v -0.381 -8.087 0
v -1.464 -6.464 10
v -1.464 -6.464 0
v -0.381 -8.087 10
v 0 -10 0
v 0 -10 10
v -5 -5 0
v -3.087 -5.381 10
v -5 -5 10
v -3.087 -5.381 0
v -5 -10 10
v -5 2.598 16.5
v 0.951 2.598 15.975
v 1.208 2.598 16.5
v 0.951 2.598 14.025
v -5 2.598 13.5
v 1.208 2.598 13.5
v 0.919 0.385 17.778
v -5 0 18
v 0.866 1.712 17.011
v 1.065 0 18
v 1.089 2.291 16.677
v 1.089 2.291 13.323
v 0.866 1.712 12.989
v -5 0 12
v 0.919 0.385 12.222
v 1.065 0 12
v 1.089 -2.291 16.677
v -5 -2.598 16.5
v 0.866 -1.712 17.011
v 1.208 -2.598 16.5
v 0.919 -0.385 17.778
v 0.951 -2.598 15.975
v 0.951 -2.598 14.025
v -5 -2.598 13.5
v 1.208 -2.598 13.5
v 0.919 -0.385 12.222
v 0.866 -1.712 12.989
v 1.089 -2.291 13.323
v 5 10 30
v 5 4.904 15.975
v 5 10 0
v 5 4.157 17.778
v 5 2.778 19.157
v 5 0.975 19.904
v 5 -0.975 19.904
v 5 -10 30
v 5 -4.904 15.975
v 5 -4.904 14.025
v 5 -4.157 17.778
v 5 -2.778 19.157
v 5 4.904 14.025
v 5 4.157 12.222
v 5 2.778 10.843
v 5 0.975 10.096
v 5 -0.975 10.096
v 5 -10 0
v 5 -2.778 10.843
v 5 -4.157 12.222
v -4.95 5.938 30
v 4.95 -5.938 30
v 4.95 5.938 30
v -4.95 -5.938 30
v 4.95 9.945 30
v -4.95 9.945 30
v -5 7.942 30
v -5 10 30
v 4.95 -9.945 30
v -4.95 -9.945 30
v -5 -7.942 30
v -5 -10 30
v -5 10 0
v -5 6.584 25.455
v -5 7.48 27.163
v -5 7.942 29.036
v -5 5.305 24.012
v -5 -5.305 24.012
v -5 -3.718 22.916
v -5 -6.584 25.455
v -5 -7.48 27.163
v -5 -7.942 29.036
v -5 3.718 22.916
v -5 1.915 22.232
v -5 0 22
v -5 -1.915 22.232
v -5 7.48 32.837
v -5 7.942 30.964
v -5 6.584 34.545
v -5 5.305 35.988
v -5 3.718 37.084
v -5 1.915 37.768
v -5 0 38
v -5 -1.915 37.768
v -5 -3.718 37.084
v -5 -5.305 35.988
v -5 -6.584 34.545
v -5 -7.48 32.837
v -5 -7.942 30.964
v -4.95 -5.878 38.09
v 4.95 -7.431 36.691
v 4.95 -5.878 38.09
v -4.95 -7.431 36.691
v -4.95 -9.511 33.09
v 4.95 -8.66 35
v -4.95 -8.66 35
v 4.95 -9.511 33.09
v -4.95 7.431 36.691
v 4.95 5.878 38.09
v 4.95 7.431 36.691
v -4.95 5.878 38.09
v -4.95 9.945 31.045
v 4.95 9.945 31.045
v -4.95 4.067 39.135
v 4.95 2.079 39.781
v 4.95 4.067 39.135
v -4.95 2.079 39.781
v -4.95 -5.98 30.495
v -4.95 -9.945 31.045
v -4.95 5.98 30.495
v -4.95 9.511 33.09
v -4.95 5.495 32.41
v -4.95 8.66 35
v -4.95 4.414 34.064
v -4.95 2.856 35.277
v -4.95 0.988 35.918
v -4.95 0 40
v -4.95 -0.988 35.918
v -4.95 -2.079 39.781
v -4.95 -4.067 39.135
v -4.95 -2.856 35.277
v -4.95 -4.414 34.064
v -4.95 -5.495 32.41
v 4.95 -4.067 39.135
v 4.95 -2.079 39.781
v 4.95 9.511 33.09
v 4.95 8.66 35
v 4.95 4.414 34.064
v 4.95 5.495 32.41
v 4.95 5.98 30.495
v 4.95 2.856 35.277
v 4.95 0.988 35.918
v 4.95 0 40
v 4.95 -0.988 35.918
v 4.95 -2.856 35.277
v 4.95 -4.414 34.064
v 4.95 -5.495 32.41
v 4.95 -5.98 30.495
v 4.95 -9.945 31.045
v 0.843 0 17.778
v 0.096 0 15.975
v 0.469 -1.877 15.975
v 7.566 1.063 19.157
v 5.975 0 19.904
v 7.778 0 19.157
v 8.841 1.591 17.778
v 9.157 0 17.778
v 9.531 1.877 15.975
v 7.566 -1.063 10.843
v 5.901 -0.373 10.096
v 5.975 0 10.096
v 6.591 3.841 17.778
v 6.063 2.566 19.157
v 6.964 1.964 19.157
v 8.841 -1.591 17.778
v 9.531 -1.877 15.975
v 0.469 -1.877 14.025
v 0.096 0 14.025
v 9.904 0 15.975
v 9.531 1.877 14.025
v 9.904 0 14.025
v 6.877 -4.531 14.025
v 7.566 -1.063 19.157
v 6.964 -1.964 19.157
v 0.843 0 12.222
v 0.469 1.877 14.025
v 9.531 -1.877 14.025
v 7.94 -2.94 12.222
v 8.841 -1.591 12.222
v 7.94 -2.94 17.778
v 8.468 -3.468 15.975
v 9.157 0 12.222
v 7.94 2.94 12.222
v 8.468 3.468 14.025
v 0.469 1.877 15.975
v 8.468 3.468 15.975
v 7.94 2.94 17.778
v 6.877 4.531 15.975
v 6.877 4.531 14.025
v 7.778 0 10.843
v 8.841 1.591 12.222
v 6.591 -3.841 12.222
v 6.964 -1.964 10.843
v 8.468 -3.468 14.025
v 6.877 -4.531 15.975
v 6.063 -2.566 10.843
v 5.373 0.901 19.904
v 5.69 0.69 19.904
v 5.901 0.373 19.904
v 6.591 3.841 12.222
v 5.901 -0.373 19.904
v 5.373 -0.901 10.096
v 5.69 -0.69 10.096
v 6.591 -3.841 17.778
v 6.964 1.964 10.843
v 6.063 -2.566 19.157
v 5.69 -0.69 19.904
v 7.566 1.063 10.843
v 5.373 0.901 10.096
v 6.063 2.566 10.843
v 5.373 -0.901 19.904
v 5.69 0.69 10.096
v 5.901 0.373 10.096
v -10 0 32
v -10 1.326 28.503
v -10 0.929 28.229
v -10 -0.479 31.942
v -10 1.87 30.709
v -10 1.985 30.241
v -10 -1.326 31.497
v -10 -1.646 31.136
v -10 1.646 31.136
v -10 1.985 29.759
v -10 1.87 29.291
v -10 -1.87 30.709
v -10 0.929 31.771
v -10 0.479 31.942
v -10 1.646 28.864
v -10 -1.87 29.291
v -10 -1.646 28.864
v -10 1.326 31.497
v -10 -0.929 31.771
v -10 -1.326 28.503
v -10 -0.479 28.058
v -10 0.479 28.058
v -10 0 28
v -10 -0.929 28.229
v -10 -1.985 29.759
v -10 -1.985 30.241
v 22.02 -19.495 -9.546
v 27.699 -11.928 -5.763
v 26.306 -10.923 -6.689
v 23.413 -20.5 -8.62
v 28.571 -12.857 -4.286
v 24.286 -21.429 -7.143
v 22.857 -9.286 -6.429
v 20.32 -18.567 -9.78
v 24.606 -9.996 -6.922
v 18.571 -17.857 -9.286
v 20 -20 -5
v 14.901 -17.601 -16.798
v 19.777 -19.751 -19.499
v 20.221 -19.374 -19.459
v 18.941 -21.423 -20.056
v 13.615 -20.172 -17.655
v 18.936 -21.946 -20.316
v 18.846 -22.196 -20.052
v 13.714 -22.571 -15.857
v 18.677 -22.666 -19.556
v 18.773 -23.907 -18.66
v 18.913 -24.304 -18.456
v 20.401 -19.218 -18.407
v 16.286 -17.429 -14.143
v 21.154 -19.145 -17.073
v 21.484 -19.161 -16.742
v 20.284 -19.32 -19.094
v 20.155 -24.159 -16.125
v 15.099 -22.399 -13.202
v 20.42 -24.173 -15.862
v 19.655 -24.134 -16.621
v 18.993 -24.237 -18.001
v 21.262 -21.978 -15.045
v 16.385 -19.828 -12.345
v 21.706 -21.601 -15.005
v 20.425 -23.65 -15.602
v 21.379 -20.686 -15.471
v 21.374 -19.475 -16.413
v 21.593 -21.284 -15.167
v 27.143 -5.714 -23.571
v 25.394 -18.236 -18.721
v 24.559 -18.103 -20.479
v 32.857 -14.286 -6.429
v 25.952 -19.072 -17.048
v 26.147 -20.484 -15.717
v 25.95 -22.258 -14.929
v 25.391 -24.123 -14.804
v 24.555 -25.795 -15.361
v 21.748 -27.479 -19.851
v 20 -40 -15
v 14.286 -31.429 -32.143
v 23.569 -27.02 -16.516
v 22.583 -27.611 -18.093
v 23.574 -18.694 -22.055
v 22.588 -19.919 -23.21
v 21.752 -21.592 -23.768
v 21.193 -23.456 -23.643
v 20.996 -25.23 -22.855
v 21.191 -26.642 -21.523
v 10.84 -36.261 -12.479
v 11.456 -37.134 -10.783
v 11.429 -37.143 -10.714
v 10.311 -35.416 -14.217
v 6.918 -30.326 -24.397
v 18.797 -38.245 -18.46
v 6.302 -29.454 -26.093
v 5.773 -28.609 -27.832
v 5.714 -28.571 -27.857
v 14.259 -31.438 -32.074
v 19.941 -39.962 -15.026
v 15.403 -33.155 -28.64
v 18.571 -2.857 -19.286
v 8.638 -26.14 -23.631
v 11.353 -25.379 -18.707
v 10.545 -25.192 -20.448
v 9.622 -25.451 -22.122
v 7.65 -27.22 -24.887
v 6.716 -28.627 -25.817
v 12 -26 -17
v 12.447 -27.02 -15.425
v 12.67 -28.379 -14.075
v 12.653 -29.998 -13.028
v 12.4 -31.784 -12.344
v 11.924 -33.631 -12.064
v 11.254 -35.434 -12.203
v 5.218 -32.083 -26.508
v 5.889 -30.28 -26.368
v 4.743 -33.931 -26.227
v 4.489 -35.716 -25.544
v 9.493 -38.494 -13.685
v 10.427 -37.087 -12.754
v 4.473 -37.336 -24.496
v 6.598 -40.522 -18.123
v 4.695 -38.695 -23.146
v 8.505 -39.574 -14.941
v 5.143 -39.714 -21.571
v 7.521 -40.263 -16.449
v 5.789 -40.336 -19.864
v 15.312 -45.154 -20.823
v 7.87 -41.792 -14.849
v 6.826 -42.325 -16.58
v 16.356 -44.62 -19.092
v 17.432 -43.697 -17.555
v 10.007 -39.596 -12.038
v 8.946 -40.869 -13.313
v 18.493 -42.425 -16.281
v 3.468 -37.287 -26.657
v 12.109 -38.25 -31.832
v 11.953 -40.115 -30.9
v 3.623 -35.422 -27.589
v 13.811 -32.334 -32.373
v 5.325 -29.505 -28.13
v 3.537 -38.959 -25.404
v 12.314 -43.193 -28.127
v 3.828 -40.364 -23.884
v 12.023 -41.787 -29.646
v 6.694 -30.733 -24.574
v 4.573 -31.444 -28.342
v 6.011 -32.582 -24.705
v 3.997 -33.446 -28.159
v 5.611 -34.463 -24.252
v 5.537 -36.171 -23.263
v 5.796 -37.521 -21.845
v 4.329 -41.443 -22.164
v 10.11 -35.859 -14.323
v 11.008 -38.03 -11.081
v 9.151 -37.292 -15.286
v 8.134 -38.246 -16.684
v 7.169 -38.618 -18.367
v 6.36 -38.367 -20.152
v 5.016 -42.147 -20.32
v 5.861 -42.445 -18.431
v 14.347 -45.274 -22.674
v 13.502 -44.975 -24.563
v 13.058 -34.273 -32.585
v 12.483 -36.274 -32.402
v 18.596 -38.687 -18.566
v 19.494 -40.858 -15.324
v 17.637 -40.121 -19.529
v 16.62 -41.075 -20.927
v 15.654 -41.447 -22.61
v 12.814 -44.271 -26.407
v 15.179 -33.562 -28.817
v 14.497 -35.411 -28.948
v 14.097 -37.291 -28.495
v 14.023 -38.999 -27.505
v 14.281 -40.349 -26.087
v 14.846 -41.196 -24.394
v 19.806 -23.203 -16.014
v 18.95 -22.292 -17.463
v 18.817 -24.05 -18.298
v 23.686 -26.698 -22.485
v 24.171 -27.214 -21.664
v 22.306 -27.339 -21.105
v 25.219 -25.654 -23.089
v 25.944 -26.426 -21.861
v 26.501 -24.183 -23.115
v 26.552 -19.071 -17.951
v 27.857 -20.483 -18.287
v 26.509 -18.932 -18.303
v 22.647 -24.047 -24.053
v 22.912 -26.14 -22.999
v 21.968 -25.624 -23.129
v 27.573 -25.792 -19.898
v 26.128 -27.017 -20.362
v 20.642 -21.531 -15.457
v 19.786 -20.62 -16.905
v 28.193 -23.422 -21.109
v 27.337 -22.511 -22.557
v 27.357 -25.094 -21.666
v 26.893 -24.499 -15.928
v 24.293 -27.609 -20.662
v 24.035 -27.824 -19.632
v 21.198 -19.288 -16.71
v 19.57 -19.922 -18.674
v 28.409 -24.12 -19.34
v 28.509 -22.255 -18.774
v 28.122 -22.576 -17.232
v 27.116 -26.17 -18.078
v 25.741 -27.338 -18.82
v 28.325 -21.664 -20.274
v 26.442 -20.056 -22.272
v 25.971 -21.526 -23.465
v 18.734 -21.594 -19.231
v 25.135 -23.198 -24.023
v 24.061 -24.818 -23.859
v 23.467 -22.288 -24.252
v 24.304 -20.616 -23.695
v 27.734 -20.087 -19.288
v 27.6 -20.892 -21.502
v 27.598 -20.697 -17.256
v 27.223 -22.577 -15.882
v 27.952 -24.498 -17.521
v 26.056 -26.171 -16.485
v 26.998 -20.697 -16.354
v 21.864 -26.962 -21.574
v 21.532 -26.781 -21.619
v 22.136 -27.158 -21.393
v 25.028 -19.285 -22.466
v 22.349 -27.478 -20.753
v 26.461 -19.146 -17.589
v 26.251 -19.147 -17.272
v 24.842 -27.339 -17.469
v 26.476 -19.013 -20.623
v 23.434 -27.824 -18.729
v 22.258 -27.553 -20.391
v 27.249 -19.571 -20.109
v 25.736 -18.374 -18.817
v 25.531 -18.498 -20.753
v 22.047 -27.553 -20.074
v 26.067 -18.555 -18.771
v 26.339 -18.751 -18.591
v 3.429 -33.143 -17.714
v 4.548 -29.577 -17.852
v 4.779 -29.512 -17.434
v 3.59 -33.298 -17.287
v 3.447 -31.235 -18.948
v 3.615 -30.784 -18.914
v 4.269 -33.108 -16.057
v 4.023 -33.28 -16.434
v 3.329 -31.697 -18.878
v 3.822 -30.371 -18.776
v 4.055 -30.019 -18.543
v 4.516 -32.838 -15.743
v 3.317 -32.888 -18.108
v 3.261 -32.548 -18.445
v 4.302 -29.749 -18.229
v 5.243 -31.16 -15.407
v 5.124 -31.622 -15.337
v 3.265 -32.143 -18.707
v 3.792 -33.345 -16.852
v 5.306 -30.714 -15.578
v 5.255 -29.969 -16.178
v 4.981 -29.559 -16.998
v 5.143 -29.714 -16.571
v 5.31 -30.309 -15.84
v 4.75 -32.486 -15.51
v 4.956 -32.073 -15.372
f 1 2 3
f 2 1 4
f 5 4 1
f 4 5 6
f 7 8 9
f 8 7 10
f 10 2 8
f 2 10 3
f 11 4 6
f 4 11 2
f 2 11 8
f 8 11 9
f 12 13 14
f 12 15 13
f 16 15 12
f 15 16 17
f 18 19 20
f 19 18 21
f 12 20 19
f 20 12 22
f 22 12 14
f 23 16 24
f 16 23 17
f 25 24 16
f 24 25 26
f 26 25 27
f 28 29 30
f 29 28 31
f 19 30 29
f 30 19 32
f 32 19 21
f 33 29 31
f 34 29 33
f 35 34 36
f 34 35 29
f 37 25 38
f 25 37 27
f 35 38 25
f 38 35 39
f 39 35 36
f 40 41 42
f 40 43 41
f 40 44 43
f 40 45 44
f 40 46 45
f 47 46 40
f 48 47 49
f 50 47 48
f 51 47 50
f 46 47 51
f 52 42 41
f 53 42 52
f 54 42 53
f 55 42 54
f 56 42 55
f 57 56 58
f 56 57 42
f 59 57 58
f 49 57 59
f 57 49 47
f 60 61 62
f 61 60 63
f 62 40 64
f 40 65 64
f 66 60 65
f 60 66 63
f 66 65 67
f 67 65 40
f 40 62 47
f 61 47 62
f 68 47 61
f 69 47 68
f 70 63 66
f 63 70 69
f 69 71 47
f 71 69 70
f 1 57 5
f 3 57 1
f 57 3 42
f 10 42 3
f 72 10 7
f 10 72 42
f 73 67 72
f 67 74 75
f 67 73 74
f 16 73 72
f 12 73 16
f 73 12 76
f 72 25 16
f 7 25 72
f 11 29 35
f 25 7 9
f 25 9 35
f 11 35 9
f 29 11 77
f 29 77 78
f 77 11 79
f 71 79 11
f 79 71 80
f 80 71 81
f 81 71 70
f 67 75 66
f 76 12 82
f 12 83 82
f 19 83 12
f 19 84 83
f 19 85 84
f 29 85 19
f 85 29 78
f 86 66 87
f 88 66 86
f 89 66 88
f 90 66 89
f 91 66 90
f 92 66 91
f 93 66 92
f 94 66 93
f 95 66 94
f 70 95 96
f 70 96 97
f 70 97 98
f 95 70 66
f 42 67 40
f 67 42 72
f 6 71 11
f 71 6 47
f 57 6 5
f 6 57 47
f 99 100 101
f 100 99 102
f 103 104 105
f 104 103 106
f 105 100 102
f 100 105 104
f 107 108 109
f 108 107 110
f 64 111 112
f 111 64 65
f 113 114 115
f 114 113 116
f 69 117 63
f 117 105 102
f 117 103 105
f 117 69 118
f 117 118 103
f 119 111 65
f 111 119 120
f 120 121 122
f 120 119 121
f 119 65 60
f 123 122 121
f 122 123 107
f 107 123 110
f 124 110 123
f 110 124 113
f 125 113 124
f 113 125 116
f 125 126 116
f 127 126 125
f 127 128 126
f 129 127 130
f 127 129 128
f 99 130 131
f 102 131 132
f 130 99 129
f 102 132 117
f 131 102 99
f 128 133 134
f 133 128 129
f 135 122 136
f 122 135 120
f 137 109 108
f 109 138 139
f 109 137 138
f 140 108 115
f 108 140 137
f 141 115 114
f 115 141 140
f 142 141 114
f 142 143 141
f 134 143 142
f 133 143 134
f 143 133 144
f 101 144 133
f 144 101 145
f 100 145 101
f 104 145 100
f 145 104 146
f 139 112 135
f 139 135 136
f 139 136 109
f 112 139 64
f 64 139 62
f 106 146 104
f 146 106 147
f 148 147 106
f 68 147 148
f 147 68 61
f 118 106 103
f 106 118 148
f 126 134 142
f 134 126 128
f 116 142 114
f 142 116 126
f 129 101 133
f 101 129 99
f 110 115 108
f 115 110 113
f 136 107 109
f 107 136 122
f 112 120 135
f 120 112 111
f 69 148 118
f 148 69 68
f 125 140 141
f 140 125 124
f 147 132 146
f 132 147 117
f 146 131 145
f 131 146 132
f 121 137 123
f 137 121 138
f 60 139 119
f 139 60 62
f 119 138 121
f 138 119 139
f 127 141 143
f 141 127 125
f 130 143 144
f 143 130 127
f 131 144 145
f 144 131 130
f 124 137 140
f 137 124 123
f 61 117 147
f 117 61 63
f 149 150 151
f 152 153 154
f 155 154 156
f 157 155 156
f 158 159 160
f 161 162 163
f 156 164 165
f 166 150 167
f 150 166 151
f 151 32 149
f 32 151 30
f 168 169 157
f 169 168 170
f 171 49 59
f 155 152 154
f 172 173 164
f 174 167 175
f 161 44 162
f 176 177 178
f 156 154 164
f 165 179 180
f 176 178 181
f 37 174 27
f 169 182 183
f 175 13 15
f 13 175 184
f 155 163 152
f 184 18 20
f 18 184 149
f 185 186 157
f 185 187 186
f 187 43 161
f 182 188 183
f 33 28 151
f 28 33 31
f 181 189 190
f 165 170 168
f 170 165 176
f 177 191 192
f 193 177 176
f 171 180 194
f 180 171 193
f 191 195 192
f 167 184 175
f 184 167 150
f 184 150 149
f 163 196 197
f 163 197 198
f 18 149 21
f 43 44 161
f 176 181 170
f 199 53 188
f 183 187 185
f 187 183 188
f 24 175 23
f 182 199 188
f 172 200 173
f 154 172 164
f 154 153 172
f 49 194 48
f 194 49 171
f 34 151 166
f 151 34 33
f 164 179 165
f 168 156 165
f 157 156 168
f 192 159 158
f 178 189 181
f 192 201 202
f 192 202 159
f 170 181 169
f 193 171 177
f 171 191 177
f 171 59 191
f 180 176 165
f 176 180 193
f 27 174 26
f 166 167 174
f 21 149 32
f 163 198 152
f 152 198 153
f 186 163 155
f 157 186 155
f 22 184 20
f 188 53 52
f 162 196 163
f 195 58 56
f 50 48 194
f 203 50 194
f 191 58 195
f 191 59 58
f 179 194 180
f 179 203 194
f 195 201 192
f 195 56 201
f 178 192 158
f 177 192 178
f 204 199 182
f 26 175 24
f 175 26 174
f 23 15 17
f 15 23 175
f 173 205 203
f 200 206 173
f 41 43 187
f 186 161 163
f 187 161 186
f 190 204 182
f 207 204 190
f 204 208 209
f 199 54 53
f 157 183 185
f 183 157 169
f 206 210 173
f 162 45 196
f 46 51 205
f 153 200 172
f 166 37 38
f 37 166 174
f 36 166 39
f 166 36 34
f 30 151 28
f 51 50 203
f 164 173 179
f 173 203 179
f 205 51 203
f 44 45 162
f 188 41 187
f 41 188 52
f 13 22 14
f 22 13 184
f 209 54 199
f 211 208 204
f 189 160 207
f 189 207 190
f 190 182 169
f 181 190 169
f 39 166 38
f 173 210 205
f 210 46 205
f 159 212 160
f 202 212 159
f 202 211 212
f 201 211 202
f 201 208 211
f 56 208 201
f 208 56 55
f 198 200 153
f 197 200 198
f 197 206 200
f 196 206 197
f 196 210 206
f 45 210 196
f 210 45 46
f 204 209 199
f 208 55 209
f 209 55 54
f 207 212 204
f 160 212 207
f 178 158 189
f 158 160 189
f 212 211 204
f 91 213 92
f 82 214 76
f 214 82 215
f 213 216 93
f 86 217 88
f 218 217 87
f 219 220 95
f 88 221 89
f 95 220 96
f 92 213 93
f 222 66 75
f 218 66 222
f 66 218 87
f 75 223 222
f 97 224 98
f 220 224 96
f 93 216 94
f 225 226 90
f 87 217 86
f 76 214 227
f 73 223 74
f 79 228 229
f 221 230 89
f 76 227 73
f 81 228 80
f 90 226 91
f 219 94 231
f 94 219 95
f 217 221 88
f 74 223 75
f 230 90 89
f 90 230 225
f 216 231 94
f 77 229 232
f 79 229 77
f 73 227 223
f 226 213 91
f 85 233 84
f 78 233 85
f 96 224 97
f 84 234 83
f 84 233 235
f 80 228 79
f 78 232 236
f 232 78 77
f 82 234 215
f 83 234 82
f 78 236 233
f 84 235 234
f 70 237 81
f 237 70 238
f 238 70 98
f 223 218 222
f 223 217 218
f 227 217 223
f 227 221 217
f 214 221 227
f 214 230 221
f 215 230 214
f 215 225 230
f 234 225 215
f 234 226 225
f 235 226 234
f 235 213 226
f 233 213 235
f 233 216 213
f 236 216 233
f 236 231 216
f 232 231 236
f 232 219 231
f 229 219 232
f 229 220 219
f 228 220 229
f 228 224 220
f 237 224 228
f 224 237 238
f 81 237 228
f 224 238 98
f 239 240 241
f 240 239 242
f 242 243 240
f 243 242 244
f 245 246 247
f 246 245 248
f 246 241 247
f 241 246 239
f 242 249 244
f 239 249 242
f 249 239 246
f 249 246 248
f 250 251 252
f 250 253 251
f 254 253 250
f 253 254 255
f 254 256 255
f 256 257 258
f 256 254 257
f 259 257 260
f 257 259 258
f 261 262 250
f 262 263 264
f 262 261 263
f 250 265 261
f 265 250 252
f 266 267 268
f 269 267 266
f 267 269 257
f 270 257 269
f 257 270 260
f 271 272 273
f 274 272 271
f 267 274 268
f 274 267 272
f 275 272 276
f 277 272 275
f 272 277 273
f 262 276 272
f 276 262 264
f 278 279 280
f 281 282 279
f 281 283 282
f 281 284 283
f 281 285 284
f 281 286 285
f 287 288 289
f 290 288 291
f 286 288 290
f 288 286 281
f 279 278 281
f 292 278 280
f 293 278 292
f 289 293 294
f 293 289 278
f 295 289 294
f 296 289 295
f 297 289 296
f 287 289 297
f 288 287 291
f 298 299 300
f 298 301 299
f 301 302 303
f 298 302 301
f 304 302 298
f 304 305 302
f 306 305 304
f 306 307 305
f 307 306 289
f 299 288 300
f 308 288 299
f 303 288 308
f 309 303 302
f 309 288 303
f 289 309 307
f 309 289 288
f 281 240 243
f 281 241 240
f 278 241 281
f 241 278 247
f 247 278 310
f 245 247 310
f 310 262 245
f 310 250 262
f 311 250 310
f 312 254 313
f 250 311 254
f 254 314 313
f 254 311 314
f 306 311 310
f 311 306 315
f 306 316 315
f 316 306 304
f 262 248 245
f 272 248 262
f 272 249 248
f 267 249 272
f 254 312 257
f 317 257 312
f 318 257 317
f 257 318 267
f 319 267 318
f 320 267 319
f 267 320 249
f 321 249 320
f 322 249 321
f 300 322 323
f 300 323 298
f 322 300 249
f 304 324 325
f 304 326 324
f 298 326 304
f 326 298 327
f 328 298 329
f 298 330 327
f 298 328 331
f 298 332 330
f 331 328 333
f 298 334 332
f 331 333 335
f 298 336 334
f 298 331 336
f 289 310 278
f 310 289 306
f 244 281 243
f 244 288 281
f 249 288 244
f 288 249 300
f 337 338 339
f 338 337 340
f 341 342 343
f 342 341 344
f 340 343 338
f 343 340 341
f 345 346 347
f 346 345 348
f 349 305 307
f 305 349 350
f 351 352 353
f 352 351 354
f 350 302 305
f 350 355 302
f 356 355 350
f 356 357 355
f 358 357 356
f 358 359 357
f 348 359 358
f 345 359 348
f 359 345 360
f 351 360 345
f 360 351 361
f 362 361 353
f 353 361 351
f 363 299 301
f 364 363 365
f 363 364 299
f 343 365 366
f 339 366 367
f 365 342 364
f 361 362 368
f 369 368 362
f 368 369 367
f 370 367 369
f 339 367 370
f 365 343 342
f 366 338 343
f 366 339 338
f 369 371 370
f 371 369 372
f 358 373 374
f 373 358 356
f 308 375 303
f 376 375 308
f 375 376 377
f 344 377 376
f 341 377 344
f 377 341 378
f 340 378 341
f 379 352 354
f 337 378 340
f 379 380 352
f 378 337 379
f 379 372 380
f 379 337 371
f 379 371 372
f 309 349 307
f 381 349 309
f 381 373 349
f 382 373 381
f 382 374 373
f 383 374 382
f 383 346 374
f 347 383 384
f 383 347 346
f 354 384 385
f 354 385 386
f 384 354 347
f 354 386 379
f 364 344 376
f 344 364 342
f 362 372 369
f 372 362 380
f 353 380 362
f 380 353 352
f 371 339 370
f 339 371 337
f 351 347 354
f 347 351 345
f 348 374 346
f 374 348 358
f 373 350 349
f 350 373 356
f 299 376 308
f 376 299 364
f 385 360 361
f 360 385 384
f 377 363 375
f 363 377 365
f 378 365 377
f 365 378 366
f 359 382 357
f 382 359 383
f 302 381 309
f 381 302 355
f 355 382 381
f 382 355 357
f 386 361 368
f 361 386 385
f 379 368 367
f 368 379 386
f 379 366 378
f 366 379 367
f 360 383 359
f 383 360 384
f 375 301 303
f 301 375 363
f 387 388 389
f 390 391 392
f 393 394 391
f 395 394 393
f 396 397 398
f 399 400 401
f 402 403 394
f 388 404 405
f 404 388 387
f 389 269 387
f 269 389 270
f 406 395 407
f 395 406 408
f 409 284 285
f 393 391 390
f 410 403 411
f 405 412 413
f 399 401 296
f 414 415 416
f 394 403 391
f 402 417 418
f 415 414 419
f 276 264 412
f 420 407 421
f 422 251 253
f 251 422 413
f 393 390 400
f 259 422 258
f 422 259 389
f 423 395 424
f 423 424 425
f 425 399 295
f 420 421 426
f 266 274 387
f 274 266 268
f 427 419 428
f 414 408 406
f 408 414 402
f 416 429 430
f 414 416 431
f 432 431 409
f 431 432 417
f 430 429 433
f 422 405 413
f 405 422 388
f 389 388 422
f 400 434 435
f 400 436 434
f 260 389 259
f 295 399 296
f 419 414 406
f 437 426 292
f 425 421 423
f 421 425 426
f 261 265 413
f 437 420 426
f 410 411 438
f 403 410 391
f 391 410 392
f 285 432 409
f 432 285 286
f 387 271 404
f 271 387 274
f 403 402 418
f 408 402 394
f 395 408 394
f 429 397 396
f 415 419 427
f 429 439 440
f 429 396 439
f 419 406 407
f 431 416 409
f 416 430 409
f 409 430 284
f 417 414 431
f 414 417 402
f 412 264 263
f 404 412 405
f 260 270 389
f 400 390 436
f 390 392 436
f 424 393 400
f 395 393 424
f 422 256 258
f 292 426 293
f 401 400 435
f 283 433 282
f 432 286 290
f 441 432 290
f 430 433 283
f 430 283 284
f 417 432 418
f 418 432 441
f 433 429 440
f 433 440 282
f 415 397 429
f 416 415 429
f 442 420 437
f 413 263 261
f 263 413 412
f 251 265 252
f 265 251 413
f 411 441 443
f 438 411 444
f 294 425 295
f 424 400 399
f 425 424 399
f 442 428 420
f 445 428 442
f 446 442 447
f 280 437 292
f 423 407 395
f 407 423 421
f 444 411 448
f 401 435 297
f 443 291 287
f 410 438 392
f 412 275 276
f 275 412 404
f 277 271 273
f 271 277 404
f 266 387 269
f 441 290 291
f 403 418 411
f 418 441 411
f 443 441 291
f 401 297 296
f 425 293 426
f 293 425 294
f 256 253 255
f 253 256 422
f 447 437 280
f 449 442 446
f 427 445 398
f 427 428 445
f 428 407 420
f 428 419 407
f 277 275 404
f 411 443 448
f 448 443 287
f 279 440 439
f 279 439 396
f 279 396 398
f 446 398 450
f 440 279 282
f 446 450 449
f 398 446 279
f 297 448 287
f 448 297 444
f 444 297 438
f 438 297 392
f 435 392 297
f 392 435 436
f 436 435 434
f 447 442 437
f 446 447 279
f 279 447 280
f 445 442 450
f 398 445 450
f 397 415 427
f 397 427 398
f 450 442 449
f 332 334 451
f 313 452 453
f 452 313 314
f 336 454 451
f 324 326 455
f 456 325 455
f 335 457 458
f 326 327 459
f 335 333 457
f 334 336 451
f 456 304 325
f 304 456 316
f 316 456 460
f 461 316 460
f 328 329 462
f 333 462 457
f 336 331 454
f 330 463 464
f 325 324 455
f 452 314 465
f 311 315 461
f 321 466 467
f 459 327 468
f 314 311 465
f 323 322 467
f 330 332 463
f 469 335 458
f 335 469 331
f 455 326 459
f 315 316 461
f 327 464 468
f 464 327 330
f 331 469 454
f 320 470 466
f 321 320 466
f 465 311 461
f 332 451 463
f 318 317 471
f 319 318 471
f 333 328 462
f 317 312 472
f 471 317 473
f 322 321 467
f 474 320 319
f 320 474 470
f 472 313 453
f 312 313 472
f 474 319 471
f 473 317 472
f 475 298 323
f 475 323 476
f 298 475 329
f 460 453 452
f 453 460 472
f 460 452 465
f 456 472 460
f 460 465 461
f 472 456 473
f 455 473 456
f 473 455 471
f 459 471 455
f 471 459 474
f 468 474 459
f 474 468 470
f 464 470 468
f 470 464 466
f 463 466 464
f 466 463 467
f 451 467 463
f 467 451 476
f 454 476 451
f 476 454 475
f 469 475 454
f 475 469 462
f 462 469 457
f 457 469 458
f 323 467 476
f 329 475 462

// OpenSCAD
/*  Copyright 2014 Pieter Gosselink
    This program is free software: you can redistribute it and/or modify
    it under the terms of the GNU General Public License as published by
    the Free Software Foundation, either version 3 of the License, or
    (at your option) any later version.

    This program is distributed in the hope that it will be useful,
    but WITHOUT ANY WARRANTY; without even the implied warranty of
    MERCHANTABILITY or FITNESS FOR A PARTICULAR PURPOSE.  See the
    GNU General Public License for more details.

    You should have received a copy of the GNU General Public License
    along with this program.  If not, see <http://www.gnu.org/licenses/>.
*/    
use <../povray.scad>;

// Direct Test
module test1() // transparency/color test
{
    openscad2povray_init();
    _union()
    {
        _difference()
        {
            _union()
            {
                _color([1,0,0]) _cube(size=[20,20,20],center=true);
                _color([0,1,0,.2]) _translate([5,5,10]) _sphere(r=5);
            }
            _translate([-5,5,10]) _cylinder(r=5,h=10,center=true);
        }        
         _color([0.5,1,0.5]) _translate([100,0,-1]) _cube(size=[200,200,2],center=true);
         for (x=[0:10:199])
            for (y=[0:10:199])
               _color([x/200,0,1-x/200,(y+9)/200]) _translate([x+5,-100+y+5,0]) _sphere(r=3);
               
    }
}


module test2() // Direct Test
{
    module obj() 
    {
        _translate([-5,-10,0]) 
        _union()
        {
            _color([1,0.5,0.5]) _difference()
            {
                _cube(size=[10,20,30]);
                _cylinder(r=5,h=20,center=true);
                _translate([5,10,15]) _rotate([0,90,0]) _cylinder(r=3,h=11,$fn=6,center=true);
            }
            _translate ([10,10,15]) _color ([0.5,0.5,1,.8]) _sphere(r=5);
            _translate([0.05,10,30]) _rotate([0,90,0]) _color([0.2,1,.2,.8]) 
            _difference()
            {
                _cylinder(r=10,h=9.9);
                _translate([0,0,-0.5]) _cylinder(r=6,h=11);
            }
            _translate([0,10,30]) _rotate([0,-90,0]) _color([1,0,1,0.2]) _cylinder(r1=8,r2=2,h=5);
        }
}
    openscad2povray_init();
    _union()
    {
        obj();
        _mirror([1,2,3]) _translate([30,0,0]) obj();
    }
}

module test3() // Indirect Test
{
    $fn=30;
    module obj(size, color)
    {
        union(){
            color(color) sphere(r=size);
            translate([0,0,size]){ 
                color(color) difference(){
                    sphere(r=size/2);
                    rotate([0,-35,0]) translate([size/2,0,0]) sphere(r=size/10);
                    rotate([0,-35,90]) translate([size/2,0,0]) sphere(r=size/10);
                }    
                color([0.2,0.2,0.2]) {
                    translate([0,0,0.75*size/2]) cylinder(r=size/3,h=size/12,center=false);
                    translate([0,0,0.75*size/2]) cylinder(r=size/4.5,h=size/2,center=false);
                }    
            }
        }
    }

    translate([100,0,5]) obj(5,[1,.5,.5,.5]*.8);
    translate([100,15,4]) rotate([0,10,0]) obj(4,[0.5,1,.5,.5]*.8);
    translate([80,0,10]) rotate([10,0,0]) obj(10,[0.5,0.5,1,.5]*.8);
    translate([50,0,15]) rotate([0,-10,10]) obj(15,[1,1,1,.5]*.8);
}

test2();
